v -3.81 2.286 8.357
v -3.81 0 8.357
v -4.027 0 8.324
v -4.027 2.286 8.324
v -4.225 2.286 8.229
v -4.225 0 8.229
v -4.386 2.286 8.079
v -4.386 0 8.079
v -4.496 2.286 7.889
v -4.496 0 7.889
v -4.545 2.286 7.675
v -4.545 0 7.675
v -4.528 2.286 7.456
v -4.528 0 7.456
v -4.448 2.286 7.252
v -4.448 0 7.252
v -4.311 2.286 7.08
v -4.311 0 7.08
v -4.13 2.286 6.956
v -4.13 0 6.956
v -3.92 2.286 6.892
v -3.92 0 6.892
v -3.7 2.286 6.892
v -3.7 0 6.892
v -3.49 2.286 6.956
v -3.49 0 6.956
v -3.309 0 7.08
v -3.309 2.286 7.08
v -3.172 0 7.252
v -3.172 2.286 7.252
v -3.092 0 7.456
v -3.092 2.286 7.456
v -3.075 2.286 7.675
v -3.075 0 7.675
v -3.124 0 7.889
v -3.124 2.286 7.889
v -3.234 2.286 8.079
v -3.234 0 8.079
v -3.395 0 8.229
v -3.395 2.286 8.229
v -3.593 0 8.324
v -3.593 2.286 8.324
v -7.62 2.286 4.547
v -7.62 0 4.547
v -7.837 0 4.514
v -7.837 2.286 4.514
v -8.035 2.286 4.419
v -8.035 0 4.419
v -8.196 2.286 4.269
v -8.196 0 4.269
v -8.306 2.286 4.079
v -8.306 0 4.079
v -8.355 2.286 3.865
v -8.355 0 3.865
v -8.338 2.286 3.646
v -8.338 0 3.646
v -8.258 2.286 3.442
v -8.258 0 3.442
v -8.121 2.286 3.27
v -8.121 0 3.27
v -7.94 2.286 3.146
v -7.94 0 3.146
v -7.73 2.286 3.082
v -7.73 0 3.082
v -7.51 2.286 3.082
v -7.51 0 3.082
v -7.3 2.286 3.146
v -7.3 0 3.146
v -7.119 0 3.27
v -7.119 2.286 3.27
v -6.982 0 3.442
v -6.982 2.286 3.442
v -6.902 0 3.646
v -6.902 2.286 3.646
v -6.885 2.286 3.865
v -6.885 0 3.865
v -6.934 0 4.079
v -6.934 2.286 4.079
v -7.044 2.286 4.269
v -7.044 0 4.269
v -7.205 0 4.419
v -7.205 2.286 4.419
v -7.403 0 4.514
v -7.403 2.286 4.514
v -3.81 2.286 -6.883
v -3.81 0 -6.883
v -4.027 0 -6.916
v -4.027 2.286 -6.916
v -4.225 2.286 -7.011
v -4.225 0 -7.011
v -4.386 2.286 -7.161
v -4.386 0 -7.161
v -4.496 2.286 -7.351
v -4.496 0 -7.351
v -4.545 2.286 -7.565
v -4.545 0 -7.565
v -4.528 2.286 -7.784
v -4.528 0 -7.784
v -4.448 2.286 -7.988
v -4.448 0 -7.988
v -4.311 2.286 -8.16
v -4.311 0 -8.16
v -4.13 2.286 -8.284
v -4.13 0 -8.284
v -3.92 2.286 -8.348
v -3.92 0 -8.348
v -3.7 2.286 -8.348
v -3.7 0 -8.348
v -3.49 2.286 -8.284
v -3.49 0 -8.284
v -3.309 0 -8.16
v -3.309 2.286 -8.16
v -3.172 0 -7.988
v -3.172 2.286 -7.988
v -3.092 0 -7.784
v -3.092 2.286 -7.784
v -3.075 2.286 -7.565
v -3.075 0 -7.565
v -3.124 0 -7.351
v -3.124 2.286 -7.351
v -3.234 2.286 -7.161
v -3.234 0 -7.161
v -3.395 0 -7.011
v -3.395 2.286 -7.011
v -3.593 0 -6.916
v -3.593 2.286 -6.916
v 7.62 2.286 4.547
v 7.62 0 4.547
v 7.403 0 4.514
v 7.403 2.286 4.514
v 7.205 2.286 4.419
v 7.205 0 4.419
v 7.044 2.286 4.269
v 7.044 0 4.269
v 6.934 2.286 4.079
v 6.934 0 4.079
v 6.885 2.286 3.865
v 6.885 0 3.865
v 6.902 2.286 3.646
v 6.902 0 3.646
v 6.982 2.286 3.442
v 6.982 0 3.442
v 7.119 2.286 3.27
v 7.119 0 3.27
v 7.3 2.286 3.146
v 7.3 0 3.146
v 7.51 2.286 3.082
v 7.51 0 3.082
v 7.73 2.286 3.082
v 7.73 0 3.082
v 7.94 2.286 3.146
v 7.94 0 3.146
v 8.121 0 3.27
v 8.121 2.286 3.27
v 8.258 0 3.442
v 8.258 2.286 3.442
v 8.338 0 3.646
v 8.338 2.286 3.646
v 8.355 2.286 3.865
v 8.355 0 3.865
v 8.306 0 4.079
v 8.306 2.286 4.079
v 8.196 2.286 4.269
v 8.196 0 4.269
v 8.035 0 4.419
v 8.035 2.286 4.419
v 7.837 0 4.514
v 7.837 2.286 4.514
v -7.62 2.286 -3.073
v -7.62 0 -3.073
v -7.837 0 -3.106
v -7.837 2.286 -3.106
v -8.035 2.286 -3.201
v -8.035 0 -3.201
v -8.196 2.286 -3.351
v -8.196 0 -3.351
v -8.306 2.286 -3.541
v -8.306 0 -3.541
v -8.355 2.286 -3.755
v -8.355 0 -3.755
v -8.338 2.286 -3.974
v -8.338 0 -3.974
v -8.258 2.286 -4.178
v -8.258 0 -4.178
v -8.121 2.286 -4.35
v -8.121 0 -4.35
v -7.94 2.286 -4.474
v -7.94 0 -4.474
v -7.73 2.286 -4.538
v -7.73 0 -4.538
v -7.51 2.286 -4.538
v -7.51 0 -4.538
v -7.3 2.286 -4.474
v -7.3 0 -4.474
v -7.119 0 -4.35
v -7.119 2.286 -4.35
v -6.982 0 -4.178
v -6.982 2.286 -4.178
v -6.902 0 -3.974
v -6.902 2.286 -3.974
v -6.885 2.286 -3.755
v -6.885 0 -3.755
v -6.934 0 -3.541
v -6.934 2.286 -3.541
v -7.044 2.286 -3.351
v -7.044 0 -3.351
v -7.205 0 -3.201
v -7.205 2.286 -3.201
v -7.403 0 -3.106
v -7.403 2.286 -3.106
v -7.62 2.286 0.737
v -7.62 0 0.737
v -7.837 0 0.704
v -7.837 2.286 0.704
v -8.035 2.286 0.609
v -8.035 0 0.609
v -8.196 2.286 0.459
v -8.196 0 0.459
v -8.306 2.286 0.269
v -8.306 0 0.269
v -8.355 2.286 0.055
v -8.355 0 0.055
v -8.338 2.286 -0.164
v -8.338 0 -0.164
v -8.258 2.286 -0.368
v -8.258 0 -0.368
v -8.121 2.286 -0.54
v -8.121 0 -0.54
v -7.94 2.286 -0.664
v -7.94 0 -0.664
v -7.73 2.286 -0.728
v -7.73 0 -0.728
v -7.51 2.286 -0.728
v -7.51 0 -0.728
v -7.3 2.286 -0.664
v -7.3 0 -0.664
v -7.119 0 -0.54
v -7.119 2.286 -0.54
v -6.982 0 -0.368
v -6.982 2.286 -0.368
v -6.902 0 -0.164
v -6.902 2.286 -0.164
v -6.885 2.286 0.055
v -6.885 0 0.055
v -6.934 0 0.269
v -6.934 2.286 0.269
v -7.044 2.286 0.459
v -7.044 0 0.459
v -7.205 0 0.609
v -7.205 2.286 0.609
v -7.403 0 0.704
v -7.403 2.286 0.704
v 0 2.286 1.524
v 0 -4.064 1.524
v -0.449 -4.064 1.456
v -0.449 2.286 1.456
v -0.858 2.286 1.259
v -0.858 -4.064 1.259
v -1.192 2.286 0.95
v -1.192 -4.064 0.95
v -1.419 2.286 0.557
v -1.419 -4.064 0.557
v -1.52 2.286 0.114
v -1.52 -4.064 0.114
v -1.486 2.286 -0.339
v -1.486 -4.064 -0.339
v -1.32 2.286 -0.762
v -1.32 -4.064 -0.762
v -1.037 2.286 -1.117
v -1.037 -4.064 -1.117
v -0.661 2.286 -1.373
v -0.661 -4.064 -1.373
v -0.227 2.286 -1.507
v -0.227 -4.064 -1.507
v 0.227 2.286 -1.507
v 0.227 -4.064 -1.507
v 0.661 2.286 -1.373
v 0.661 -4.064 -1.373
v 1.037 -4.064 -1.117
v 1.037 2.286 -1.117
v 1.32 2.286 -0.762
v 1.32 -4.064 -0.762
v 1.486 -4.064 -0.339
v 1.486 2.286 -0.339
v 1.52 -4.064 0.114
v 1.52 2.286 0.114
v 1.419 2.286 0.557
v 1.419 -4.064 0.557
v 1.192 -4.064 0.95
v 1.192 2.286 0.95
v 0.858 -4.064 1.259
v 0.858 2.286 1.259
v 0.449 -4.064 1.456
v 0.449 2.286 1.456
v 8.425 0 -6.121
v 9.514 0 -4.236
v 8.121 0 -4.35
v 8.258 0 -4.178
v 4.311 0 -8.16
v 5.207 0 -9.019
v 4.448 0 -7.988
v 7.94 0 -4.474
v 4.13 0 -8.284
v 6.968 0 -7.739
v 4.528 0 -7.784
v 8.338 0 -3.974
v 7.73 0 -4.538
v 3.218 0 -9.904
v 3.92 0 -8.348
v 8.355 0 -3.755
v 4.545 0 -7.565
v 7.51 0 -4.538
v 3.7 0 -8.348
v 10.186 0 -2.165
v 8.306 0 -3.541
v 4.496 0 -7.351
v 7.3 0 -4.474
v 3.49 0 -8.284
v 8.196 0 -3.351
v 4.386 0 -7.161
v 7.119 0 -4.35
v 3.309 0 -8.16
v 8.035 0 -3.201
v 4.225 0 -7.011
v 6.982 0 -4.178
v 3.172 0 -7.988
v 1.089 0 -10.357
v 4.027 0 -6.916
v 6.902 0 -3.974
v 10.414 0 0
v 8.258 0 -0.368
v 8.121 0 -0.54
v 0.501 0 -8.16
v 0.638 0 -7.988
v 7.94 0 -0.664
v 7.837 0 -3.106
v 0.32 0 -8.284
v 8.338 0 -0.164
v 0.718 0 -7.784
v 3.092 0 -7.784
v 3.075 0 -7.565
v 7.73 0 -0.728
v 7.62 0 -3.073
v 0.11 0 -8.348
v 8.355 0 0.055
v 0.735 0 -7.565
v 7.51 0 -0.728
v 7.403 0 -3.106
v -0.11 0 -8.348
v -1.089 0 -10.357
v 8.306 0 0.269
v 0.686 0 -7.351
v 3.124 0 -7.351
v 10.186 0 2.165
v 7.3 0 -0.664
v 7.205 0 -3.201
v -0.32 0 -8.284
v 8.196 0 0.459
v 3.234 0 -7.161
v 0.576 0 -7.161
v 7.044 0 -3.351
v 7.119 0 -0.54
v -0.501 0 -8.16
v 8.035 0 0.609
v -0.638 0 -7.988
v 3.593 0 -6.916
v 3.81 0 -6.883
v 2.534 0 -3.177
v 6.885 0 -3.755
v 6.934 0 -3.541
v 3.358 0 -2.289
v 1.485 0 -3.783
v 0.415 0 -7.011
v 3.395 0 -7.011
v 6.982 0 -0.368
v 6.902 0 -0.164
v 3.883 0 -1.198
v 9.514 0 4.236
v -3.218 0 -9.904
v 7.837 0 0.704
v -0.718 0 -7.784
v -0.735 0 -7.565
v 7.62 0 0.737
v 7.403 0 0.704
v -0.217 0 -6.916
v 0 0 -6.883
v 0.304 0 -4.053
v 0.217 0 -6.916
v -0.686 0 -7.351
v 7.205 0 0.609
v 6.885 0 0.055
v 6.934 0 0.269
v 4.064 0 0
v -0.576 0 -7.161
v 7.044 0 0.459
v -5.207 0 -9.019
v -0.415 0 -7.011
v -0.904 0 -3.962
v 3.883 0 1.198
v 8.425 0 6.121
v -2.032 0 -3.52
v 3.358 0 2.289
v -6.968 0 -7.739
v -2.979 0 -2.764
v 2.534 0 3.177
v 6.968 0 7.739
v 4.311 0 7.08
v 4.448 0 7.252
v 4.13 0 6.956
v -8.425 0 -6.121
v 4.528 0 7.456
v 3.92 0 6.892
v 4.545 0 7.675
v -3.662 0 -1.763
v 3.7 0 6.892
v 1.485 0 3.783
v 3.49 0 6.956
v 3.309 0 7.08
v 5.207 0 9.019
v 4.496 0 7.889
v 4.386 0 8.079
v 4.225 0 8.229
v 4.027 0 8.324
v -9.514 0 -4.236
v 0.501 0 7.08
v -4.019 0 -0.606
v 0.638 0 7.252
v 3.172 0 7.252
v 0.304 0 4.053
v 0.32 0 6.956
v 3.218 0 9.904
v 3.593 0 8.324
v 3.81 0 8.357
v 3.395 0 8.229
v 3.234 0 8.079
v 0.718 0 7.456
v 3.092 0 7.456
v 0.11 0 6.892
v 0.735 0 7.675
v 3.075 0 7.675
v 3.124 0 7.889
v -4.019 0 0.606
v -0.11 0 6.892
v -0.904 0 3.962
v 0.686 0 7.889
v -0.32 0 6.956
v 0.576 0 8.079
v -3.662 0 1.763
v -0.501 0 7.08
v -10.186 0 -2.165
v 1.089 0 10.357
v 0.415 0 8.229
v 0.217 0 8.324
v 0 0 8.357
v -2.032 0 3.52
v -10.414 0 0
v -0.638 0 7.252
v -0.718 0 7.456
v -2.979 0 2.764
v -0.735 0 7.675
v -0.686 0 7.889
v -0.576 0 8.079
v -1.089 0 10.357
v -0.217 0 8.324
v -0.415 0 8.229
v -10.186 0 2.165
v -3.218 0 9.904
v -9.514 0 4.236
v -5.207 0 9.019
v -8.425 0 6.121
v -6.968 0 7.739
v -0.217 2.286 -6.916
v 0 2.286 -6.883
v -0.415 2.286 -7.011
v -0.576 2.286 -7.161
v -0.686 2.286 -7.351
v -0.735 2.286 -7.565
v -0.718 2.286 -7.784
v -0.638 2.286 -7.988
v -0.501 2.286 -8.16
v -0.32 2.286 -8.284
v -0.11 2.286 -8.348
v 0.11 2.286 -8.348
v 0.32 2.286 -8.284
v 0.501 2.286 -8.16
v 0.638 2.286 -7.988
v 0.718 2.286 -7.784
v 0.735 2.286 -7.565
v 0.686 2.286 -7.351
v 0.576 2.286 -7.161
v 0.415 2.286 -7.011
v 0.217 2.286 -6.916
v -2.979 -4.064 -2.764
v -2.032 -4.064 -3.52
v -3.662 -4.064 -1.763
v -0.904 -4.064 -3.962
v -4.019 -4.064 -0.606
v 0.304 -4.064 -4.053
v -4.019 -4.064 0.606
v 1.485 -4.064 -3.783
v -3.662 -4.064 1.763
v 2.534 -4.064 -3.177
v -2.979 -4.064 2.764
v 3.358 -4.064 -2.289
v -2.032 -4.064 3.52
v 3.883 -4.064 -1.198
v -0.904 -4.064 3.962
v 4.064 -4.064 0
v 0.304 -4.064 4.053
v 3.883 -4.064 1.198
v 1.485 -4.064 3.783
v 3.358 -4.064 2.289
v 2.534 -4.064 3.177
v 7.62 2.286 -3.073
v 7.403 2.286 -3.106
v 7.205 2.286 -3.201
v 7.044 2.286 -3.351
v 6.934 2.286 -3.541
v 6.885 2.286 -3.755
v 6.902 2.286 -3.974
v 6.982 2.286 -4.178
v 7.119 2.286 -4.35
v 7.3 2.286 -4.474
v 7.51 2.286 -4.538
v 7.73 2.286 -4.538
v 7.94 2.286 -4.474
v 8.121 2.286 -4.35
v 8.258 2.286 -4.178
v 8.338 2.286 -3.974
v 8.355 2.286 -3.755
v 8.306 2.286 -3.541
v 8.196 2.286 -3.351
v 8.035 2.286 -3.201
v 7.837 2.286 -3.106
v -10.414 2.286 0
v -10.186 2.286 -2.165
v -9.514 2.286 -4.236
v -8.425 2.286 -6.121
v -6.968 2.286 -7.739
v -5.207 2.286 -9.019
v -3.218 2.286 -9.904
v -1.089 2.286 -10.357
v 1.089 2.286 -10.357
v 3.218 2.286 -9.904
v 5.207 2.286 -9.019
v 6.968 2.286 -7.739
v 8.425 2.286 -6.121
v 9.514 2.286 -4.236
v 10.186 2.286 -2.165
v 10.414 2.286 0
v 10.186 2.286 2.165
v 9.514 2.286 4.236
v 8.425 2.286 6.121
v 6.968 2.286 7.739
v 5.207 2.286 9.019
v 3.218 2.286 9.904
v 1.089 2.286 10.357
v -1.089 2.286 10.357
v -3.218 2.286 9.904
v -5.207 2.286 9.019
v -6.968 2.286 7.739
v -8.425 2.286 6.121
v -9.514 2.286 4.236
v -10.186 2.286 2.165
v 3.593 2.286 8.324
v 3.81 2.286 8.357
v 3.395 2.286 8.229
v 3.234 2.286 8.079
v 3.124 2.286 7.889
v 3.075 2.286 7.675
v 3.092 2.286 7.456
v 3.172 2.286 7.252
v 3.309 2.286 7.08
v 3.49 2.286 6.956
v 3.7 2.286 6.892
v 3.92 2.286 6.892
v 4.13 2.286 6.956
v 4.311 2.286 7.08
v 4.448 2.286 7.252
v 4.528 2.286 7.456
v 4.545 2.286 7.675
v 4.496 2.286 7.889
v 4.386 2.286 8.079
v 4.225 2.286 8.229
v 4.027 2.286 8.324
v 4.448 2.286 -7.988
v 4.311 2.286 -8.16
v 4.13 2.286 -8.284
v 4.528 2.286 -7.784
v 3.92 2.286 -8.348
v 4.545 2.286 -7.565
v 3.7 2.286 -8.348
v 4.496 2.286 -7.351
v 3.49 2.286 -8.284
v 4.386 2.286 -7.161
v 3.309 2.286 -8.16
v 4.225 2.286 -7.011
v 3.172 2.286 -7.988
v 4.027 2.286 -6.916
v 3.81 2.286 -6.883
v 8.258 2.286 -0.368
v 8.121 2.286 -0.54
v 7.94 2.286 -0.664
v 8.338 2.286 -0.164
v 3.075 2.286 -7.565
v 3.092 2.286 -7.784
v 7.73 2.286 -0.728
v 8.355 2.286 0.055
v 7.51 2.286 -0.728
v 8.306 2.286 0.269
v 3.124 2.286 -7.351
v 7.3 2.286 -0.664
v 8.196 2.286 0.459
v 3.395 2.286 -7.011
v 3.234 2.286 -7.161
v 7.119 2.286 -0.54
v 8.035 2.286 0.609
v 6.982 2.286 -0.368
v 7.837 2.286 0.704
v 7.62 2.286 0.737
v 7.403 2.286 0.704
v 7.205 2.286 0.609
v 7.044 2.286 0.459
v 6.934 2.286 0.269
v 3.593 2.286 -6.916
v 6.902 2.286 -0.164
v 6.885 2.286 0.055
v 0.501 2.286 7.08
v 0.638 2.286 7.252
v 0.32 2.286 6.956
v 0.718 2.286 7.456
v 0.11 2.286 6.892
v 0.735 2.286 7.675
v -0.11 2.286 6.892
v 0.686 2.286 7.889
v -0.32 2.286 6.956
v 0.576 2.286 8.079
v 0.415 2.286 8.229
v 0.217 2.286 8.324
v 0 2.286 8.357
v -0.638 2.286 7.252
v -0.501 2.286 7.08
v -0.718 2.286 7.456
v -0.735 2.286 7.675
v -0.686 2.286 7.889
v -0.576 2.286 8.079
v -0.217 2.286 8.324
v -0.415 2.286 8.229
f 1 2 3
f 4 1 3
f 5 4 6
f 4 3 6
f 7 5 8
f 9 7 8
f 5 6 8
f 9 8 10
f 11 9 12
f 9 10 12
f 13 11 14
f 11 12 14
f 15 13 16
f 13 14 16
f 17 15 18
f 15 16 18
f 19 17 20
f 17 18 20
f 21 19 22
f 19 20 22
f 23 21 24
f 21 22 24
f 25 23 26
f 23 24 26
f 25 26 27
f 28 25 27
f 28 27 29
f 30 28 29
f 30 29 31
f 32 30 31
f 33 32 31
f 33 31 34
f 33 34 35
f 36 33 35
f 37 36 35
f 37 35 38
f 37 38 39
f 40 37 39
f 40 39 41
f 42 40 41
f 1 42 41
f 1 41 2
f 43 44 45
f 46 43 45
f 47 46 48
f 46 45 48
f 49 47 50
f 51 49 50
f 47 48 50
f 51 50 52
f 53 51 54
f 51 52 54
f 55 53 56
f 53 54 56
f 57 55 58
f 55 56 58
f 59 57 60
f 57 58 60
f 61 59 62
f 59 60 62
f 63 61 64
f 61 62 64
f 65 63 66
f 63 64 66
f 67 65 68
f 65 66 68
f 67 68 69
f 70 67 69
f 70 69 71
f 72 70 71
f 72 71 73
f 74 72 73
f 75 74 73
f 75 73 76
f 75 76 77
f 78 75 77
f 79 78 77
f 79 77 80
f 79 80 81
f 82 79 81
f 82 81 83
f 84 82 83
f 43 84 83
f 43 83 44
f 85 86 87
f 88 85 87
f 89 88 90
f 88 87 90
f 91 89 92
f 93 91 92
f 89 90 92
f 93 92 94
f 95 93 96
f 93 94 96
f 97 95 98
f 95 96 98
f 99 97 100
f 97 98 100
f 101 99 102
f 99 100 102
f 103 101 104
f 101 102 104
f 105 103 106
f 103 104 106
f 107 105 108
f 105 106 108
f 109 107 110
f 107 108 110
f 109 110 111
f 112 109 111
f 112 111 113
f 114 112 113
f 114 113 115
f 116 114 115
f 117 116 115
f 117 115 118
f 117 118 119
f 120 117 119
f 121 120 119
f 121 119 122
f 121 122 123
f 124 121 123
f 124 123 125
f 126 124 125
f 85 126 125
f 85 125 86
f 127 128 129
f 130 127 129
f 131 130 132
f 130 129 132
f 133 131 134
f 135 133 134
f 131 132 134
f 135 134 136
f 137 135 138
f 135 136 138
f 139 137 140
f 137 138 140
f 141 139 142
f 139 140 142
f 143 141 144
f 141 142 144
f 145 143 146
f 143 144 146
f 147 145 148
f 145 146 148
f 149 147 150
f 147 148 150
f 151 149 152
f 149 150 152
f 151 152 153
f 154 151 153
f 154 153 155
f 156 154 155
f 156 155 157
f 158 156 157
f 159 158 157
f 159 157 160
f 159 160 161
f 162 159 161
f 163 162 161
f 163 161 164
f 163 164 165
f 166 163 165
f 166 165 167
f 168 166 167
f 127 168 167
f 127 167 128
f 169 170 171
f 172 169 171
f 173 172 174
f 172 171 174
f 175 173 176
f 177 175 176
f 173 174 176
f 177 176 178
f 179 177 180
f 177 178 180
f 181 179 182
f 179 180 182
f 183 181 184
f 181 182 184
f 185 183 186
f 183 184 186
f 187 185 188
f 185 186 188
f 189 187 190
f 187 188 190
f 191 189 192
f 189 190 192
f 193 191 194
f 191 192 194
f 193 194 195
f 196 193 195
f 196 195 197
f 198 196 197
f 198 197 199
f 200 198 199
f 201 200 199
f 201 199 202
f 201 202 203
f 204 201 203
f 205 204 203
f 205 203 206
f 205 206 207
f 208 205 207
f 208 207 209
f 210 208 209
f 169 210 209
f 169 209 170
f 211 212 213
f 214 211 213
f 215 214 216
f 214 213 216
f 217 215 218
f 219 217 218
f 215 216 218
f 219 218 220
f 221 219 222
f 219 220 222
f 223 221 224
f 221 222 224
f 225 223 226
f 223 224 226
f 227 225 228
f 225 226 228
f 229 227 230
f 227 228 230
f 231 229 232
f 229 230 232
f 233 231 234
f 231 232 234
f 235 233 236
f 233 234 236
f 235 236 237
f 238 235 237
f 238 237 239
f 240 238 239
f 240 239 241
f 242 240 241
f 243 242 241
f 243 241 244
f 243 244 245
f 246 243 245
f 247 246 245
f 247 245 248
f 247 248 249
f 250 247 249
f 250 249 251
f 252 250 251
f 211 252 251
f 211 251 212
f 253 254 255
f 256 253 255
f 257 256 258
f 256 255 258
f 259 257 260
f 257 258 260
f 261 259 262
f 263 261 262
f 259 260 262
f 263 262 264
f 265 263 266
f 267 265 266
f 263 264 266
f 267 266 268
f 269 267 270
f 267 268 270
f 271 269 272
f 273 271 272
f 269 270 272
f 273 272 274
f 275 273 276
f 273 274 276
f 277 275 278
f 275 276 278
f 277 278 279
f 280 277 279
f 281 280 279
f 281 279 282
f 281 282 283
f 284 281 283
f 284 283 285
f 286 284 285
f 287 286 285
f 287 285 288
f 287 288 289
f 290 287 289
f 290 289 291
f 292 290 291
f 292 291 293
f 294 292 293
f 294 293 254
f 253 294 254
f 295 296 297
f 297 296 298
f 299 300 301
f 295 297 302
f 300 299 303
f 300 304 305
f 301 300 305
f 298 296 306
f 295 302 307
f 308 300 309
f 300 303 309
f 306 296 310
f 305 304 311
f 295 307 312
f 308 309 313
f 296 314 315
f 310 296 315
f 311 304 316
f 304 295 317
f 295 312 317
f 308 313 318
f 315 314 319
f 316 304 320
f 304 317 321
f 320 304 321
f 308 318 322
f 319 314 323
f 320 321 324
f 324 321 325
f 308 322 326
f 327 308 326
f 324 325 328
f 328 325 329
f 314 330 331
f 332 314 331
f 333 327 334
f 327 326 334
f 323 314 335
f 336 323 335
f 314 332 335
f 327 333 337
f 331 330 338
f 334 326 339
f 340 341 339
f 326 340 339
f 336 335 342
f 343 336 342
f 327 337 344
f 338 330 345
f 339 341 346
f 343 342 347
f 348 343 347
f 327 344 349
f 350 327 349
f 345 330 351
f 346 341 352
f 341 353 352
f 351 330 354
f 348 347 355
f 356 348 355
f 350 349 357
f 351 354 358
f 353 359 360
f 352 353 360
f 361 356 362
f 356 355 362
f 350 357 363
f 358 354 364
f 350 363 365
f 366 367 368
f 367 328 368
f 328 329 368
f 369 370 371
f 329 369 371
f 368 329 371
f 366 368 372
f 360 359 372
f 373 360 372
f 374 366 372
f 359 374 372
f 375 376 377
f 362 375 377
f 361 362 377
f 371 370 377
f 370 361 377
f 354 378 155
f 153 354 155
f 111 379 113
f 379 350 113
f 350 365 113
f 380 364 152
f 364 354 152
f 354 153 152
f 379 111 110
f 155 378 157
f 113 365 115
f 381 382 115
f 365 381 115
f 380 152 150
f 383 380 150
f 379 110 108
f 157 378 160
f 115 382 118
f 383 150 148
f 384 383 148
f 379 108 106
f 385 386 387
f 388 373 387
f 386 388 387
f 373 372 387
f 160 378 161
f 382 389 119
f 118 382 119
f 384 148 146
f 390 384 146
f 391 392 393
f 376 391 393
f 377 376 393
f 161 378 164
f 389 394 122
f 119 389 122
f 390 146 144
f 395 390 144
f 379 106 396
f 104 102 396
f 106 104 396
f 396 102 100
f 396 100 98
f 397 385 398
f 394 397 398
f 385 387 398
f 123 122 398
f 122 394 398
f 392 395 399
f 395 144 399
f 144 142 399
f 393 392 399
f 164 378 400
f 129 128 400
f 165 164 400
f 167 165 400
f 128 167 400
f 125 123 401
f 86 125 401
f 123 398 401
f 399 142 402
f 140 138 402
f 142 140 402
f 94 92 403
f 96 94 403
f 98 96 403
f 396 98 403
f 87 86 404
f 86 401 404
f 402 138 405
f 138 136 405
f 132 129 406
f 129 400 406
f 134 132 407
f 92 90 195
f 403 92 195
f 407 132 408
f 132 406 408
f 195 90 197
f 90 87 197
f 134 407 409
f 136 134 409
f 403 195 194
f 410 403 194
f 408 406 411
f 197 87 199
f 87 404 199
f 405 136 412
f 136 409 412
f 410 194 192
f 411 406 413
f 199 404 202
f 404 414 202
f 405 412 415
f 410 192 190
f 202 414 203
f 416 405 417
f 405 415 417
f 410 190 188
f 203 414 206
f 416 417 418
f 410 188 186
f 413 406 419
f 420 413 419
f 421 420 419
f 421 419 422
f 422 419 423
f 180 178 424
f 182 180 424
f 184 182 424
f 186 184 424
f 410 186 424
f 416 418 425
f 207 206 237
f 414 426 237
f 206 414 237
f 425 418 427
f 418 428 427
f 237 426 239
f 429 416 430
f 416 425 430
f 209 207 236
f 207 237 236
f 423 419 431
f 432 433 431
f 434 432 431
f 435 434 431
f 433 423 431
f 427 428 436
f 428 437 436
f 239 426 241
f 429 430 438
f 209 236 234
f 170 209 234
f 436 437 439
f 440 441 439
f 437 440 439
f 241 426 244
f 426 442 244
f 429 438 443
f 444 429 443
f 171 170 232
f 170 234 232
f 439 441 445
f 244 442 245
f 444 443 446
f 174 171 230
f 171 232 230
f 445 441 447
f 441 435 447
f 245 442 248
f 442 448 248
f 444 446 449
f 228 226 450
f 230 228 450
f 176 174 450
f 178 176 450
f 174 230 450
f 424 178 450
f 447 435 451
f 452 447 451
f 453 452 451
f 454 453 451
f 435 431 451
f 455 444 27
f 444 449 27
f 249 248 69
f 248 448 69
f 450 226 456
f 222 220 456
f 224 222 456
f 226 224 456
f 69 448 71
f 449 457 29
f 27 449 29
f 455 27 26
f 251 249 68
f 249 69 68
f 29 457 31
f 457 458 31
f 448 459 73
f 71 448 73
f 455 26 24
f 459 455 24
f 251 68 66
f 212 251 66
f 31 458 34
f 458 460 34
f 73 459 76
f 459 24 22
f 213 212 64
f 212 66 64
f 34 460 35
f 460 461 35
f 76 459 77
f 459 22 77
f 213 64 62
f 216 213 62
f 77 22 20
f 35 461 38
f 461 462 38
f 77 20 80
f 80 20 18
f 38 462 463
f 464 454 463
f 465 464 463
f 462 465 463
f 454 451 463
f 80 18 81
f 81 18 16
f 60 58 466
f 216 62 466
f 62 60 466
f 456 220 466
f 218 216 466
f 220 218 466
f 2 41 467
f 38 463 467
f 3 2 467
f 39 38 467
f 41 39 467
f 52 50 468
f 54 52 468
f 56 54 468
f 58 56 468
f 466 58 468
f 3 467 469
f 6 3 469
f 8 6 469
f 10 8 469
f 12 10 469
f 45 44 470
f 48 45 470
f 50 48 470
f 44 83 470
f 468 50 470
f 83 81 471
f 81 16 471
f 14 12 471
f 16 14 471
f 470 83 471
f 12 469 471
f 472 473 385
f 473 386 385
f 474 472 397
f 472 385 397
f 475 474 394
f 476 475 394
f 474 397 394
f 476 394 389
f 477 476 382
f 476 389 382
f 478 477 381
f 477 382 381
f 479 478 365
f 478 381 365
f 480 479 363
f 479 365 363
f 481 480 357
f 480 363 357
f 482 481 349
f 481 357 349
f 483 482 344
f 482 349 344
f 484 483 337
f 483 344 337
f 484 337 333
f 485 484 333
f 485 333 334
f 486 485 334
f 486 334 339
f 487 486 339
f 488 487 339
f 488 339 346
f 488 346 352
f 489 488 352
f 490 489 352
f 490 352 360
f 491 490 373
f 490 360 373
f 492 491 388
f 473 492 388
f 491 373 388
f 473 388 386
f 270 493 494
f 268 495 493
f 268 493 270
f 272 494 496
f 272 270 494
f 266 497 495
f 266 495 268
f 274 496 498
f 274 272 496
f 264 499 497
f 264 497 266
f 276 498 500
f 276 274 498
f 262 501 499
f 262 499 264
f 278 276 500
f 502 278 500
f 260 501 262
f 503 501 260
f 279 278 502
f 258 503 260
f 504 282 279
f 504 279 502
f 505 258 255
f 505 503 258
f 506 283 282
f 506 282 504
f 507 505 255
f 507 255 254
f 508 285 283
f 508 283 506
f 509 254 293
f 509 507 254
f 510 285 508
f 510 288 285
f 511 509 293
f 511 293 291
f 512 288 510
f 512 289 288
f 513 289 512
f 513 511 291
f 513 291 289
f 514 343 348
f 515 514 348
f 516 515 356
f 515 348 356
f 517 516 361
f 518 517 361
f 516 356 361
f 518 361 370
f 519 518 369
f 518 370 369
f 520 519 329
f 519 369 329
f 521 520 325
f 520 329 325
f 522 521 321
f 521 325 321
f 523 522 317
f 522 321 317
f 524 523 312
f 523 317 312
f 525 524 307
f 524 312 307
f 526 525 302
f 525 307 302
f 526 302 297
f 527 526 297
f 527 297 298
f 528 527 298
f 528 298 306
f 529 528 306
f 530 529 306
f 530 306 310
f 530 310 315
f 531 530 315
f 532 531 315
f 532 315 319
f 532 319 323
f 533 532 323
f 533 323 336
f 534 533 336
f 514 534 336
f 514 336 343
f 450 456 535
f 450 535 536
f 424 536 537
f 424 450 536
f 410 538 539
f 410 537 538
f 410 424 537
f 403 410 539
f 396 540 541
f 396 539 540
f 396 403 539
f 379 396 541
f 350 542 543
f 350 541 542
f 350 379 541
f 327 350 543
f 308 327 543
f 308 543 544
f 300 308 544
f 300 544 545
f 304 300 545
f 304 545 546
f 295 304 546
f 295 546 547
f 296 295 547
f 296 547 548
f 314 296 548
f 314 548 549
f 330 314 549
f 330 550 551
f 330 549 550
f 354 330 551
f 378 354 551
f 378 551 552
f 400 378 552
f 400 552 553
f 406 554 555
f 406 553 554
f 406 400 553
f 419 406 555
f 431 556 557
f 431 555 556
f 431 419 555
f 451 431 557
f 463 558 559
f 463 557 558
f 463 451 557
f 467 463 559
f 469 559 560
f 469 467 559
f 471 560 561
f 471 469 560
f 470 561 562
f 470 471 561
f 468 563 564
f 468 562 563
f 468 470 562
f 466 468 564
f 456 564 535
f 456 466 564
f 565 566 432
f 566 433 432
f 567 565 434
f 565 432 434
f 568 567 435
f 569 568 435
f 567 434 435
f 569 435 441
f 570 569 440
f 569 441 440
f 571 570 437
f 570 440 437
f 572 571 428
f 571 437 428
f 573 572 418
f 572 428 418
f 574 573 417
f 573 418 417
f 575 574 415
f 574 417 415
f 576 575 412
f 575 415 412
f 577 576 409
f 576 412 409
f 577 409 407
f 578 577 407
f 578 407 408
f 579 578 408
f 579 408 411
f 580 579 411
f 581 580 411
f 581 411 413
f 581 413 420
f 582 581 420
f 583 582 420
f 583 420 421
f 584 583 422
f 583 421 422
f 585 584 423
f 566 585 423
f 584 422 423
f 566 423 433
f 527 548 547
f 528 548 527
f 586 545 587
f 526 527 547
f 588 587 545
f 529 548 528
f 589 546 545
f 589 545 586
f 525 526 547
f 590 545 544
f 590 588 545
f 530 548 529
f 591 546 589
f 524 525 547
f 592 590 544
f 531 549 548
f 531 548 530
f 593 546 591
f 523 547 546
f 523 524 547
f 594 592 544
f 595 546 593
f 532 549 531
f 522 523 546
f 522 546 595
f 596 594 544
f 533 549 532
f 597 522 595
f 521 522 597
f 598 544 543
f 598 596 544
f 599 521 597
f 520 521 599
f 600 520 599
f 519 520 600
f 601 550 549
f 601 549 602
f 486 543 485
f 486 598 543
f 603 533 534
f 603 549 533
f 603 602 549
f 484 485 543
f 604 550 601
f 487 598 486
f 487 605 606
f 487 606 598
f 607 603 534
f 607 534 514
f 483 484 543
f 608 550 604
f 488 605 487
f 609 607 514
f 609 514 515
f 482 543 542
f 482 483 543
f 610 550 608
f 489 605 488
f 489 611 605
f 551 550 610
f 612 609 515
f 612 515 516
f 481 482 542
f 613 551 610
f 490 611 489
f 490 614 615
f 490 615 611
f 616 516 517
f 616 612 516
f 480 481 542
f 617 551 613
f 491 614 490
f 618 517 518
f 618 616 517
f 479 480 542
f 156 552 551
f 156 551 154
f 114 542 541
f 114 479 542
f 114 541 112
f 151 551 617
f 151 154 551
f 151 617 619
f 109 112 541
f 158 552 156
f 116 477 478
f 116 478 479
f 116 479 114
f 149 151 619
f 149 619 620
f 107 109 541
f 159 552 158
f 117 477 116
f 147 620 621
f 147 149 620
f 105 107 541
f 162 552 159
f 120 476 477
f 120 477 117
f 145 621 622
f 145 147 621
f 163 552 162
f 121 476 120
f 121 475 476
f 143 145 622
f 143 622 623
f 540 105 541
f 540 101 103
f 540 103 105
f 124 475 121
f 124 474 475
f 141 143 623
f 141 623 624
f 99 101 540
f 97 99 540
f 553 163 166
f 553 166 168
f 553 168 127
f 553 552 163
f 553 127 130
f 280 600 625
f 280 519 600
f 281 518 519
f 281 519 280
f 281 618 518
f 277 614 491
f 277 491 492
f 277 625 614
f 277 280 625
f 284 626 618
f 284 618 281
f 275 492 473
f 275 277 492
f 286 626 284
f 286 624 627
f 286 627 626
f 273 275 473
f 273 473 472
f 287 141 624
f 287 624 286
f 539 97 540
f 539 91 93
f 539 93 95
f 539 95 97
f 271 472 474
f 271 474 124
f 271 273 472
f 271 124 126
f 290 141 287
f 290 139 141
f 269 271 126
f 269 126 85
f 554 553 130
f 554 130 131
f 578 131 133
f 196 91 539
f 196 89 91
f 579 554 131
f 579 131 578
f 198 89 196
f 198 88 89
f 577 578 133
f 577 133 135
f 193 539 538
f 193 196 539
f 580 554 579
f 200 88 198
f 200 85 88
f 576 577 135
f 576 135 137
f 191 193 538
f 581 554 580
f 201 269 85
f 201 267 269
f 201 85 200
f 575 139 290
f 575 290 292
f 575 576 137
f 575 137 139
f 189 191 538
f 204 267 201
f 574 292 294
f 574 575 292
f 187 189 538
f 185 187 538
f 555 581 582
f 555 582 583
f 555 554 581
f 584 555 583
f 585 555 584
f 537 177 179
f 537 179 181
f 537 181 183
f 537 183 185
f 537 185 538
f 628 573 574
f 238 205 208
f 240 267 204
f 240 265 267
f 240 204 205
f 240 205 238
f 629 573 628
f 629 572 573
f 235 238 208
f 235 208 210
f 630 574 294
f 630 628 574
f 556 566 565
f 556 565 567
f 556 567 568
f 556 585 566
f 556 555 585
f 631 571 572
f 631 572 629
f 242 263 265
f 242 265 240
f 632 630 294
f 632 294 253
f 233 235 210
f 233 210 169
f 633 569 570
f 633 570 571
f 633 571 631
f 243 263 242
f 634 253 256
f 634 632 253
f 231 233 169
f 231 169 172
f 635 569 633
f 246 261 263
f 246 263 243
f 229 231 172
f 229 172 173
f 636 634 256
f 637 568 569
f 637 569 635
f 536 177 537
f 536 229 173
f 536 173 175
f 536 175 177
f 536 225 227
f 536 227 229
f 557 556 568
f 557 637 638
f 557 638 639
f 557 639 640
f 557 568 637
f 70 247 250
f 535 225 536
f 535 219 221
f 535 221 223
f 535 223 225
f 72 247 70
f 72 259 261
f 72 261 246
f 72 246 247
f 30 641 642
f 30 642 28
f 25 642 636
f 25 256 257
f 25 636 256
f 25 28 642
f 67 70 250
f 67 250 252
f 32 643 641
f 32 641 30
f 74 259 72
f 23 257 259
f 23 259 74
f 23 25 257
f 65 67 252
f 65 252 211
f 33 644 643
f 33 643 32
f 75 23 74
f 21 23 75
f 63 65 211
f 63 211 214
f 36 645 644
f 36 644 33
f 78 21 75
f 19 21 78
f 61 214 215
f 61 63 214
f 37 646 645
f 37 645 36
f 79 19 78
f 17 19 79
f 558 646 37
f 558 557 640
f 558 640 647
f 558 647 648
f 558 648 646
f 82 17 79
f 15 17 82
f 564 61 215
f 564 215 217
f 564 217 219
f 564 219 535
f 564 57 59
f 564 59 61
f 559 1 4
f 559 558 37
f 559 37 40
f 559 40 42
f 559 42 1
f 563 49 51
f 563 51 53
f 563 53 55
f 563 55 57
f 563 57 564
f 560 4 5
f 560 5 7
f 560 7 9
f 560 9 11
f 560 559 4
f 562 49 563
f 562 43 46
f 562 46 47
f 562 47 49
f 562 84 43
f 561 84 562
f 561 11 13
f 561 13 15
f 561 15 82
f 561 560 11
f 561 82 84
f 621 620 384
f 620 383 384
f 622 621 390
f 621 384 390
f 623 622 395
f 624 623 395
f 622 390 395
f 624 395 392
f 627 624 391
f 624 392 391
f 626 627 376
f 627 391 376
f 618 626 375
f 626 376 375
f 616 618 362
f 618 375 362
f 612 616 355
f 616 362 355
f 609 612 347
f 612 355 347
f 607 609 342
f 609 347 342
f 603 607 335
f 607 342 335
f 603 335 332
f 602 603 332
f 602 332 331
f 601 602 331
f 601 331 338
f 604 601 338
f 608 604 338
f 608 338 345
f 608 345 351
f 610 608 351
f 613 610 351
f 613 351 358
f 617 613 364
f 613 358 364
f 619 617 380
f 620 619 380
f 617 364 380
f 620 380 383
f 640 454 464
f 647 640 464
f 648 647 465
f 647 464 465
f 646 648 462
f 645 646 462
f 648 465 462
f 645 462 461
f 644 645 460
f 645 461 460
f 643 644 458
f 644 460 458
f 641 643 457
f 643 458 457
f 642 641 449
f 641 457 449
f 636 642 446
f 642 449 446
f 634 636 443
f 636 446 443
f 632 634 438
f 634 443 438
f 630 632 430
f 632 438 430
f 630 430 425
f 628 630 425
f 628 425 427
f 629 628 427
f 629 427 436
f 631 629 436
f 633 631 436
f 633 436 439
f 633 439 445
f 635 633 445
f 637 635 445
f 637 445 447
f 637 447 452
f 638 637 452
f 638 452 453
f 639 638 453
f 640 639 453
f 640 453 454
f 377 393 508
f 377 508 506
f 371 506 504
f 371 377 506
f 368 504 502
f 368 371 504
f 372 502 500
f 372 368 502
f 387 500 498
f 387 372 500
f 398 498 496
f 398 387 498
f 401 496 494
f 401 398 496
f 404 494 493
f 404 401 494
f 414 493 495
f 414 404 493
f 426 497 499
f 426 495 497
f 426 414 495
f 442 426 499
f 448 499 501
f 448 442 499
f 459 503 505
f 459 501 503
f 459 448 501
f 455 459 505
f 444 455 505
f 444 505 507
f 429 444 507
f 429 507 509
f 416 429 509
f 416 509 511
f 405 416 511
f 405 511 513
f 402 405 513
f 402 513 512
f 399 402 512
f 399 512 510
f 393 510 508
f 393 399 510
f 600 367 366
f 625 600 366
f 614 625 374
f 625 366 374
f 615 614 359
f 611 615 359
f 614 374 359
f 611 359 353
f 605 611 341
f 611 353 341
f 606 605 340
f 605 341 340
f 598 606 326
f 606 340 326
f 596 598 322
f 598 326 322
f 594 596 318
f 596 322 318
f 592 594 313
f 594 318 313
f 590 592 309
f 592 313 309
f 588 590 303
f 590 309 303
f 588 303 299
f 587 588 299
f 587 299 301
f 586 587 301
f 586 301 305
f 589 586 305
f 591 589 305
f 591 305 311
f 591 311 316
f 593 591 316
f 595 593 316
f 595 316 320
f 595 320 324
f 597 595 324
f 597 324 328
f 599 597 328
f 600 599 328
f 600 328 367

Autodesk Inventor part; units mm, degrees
ref_plane "YZ Plane" through (0, 0, 0) normal (1, 0, 0) x (0, 1, 0)
ref_plane "XZ Plane" through (0, 0, 0) normal (0, 1, 0) x (-1, 0, 0)
ref_plane "XY Plane" through (0, 0, 0) normal (0, 0, 1) x (1, 0, 0)
sketch "Sketch1" plane through (0, 0, 0) normal (0, 1, 0) x (-1, 0, 0)
  circle A0 centre (0, 0) radius 10.414
  dimension "d0" = 20.828
extrude "Extrusion1" add sketch "Sketch1" along normal blind 2.286
sketch "Sketch2" plane through (0, 0, 0) normal (0, -1, 0) x (1, 0, 0)
  circle A0 centre (0, 0) radius 10.414 projected
  circle A1 centre (0, 0) radius 4.064
  dimension "d3" = 8.128
extrude "Extrusion2" add sketch "Sketch2" along normal blind 4.064 contours A1
sketch "Sketch3" plane through (0, 2.286, 0) normal (0, 1, 0) x (1, 0, 0)
  circle A0 centre (0, 0) radius 10.414 projected
  circle A1 centre (0, 0) radius 7.62 construction
  line L0 (-7.62, 0) -> (-7.62, -7.62) construction
  line L1 (-7.62, -7.62) -> (7.62, -7.62) construction
  line L2 (7.62, -7.62) -> (7.62, 7.62) construction
  line L3 (7.62, 7.62) -> (-7.62, 7.62) construction
  line L4 (-7.62, 7.62) -> (-7.62, 0) construction
  point P0 (0, 7.62)
  point P1 (3.81, 7.62)
  point P2 (-3.81, 7.62)
  point P3 (7.62, 0)
  point P4 (7.62, 3.81)
  point P5 (7.62, -3.81)
  point P6 (-7.62, 3.81)
  point P7 (-7.62, -3.81)
  point P8 (0, -7.62)
  point P9 (-3.81, -7.62)
  point P10 (3.81, -7.62)
  dimension "d6" = 15.24
  dimension "d8" = 7.62
  dimension "d9" = 7.62
  dimension "d10" = 7.62
  dimension "d11" = 3.81
  dimension "d12" = 3.81
  dimension "d13" = 3.81
  dimension "d14" = 3.81
  dimension "d15" = 3.81
  dimension "d16" = 3.81
  dimension "d17" = 3.81
  dimension "d18" = 3.81
hole "Hole1" at (0, 2.286, -7.62) at (3.81, 2.286, -7.62) at (-3.81, 2.286, -7.62) at (7.62, 2.286, 0) at (7.62, 2.286, -3.81) at (7.62, 2.286, 3.81) at (-7.62, 2.286, 0) at (-7.62, 2.286, -3.81) at (-7.62, 2.286, 3.81) at (0, 2.286, 7.62) at (-3.81, 2.286, 7.62) at (3.81, 2.286, 7.62) direction (0, -1, 0) diameter 1.4732 end through all
hole "Hole2" at (0, 2.286, 0) direction (0, -1, 0) diameter 3.048 end through all
properties part number "horn01" material "Aluminum 6061"
